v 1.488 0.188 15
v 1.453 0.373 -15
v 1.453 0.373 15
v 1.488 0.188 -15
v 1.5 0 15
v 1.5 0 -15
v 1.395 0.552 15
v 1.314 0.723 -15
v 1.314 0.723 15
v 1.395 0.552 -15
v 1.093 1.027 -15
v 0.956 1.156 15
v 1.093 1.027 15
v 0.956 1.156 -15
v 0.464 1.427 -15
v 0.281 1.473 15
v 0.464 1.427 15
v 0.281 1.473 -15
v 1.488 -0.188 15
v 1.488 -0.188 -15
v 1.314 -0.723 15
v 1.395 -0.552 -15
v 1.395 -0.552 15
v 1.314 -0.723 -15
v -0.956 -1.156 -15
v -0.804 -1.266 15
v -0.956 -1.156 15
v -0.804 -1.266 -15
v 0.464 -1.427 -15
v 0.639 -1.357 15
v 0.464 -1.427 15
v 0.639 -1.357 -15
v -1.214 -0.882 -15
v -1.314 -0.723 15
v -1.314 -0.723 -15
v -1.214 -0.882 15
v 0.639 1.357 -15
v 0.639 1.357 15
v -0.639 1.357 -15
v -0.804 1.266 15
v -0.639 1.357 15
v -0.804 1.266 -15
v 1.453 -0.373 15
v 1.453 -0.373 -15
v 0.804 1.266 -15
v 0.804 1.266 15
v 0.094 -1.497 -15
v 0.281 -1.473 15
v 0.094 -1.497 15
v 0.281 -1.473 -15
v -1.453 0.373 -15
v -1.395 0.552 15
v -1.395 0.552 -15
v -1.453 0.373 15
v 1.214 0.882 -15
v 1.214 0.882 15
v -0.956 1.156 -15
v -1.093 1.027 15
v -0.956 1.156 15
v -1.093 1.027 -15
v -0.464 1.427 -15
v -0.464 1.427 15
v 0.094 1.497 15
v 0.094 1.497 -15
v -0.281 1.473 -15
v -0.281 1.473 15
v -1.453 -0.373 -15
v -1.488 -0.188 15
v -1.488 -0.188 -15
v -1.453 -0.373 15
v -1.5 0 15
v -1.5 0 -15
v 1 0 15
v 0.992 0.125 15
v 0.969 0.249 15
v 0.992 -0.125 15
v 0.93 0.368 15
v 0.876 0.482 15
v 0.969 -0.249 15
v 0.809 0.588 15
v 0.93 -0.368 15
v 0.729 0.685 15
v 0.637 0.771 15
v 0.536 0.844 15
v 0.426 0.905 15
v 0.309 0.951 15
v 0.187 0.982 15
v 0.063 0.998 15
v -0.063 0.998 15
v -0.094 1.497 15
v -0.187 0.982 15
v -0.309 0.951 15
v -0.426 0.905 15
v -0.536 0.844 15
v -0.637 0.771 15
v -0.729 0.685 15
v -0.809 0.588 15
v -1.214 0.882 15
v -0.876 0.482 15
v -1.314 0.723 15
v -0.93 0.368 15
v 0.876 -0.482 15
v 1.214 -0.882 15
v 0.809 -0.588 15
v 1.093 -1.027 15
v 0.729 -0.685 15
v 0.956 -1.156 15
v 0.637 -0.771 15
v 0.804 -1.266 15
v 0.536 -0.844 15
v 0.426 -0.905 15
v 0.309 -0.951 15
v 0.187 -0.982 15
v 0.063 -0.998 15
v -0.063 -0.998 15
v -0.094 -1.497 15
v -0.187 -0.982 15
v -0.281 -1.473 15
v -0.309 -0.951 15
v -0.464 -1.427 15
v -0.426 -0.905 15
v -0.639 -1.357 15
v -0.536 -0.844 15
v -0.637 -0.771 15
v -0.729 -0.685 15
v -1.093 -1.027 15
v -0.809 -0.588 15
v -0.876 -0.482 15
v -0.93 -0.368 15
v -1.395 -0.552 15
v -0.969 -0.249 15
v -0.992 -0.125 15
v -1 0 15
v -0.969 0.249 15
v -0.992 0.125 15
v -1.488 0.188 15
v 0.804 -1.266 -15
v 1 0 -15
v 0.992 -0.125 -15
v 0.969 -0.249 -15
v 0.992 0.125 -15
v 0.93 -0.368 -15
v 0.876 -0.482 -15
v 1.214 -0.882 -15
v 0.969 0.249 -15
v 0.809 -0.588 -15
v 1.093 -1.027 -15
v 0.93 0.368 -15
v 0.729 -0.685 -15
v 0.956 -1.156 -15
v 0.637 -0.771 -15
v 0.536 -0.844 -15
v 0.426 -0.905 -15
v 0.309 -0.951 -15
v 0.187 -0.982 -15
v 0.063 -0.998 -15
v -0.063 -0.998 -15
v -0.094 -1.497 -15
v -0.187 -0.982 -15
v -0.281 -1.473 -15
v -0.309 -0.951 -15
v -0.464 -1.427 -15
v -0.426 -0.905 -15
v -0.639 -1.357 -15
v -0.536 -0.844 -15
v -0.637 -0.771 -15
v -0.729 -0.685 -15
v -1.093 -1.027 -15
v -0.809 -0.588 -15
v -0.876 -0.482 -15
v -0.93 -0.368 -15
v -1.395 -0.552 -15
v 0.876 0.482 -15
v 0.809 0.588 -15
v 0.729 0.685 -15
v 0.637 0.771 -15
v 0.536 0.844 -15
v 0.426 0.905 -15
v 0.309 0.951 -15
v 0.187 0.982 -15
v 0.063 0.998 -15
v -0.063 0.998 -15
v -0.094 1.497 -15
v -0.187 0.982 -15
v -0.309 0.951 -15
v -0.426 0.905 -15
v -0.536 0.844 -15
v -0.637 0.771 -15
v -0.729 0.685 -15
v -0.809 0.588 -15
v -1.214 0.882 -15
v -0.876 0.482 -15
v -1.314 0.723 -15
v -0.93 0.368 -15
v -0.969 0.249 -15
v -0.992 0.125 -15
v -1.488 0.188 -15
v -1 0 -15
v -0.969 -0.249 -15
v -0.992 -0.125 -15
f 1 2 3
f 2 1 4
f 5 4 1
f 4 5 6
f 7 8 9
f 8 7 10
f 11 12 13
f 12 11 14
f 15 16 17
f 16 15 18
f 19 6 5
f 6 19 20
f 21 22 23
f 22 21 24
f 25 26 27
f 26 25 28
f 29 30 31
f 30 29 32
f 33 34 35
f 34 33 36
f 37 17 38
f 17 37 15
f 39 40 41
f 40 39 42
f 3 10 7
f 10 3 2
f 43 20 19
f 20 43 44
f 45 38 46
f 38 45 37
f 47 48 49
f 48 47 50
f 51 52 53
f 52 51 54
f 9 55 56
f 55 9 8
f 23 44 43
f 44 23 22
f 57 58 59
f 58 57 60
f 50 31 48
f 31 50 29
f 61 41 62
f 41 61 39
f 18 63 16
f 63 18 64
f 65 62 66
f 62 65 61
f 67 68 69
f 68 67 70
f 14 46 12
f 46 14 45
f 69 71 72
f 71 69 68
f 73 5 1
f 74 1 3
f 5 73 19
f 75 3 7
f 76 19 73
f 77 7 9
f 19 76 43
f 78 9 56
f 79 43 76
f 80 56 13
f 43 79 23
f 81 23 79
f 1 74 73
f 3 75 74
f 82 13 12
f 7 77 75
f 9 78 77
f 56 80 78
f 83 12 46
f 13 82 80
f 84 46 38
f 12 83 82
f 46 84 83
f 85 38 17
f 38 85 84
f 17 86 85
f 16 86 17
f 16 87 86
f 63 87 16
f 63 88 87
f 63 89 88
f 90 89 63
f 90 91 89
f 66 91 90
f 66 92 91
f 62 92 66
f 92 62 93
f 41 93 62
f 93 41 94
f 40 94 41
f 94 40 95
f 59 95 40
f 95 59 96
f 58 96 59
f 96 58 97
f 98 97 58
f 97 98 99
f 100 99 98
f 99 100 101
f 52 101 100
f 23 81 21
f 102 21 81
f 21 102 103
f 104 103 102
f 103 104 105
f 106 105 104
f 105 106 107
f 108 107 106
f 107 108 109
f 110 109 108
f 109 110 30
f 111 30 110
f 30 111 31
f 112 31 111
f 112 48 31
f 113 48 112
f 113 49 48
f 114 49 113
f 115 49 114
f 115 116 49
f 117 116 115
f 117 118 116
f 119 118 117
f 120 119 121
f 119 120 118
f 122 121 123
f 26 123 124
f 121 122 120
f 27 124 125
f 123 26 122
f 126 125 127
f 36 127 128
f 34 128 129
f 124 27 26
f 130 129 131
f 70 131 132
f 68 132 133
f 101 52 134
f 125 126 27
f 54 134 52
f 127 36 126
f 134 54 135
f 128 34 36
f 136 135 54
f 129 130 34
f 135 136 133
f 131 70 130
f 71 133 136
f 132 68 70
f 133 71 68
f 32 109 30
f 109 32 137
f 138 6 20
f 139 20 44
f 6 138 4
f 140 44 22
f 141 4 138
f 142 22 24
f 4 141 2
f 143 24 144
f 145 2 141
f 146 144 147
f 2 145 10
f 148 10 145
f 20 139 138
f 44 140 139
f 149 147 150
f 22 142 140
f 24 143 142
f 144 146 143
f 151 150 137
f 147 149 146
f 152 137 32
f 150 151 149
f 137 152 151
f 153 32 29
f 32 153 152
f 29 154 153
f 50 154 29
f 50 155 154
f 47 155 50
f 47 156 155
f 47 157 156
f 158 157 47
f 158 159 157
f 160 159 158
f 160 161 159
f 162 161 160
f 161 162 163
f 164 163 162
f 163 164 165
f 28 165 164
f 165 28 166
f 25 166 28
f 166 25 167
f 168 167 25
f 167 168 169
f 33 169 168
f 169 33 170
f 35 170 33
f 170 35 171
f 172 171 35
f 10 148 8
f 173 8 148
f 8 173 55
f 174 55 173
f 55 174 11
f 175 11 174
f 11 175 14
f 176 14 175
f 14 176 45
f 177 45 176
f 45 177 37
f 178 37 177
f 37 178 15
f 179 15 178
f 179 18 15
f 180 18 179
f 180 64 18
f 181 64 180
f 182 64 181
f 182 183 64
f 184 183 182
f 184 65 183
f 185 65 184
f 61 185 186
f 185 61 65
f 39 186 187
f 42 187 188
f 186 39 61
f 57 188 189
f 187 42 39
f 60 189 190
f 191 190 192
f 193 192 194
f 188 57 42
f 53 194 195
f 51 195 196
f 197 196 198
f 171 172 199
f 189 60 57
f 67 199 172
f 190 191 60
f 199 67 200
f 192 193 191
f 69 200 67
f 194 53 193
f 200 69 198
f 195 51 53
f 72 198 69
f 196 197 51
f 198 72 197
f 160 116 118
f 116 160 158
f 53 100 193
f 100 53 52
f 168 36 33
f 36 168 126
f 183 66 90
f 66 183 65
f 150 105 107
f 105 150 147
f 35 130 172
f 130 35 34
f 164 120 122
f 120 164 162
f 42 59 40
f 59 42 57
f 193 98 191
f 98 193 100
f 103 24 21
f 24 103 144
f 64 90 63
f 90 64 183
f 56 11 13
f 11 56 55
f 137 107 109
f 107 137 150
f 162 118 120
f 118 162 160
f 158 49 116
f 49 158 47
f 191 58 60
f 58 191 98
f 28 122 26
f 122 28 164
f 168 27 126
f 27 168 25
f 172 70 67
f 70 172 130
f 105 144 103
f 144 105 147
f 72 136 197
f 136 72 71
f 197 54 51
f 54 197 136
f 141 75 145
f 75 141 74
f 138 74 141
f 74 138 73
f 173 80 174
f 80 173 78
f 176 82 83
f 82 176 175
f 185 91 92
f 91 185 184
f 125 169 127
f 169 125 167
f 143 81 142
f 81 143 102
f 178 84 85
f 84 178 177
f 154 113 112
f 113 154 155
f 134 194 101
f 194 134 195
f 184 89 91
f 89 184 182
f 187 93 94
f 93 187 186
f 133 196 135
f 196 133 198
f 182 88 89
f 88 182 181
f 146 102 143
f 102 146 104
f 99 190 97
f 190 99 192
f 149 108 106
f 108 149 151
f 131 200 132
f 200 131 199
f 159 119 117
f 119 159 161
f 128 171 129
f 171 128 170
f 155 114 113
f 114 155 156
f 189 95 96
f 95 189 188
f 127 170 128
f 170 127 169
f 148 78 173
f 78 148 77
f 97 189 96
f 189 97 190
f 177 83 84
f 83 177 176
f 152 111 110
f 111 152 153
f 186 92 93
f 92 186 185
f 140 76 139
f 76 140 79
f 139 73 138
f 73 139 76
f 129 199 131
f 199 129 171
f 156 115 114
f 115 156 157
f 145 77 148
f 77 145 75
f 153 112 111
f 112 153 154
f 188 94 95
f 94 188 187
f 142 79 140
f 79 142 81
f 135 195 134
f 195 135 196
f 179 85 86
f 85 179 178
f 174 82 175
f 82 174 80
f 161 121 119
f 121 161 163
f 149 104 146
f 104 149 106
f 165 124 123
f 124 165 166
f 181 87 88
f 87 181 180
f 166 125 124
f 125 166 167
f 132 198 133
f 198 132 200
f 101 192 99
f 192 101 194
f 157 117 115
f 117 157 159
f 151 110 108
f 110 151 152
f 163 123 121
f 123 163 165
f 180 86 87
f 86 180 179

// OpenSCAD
$fn = 50;


difference() {
	union() {
		translate(v = [0, 0, -15.0000000000]) {
			cylinder(h = 30, r = 1.5000000000);
		}
	}
	union() {
		translate(v = [0, 0, -100.0000000000]) {
			cylinder(h = 200, r = 1.0000000000);
		}
	}
}
